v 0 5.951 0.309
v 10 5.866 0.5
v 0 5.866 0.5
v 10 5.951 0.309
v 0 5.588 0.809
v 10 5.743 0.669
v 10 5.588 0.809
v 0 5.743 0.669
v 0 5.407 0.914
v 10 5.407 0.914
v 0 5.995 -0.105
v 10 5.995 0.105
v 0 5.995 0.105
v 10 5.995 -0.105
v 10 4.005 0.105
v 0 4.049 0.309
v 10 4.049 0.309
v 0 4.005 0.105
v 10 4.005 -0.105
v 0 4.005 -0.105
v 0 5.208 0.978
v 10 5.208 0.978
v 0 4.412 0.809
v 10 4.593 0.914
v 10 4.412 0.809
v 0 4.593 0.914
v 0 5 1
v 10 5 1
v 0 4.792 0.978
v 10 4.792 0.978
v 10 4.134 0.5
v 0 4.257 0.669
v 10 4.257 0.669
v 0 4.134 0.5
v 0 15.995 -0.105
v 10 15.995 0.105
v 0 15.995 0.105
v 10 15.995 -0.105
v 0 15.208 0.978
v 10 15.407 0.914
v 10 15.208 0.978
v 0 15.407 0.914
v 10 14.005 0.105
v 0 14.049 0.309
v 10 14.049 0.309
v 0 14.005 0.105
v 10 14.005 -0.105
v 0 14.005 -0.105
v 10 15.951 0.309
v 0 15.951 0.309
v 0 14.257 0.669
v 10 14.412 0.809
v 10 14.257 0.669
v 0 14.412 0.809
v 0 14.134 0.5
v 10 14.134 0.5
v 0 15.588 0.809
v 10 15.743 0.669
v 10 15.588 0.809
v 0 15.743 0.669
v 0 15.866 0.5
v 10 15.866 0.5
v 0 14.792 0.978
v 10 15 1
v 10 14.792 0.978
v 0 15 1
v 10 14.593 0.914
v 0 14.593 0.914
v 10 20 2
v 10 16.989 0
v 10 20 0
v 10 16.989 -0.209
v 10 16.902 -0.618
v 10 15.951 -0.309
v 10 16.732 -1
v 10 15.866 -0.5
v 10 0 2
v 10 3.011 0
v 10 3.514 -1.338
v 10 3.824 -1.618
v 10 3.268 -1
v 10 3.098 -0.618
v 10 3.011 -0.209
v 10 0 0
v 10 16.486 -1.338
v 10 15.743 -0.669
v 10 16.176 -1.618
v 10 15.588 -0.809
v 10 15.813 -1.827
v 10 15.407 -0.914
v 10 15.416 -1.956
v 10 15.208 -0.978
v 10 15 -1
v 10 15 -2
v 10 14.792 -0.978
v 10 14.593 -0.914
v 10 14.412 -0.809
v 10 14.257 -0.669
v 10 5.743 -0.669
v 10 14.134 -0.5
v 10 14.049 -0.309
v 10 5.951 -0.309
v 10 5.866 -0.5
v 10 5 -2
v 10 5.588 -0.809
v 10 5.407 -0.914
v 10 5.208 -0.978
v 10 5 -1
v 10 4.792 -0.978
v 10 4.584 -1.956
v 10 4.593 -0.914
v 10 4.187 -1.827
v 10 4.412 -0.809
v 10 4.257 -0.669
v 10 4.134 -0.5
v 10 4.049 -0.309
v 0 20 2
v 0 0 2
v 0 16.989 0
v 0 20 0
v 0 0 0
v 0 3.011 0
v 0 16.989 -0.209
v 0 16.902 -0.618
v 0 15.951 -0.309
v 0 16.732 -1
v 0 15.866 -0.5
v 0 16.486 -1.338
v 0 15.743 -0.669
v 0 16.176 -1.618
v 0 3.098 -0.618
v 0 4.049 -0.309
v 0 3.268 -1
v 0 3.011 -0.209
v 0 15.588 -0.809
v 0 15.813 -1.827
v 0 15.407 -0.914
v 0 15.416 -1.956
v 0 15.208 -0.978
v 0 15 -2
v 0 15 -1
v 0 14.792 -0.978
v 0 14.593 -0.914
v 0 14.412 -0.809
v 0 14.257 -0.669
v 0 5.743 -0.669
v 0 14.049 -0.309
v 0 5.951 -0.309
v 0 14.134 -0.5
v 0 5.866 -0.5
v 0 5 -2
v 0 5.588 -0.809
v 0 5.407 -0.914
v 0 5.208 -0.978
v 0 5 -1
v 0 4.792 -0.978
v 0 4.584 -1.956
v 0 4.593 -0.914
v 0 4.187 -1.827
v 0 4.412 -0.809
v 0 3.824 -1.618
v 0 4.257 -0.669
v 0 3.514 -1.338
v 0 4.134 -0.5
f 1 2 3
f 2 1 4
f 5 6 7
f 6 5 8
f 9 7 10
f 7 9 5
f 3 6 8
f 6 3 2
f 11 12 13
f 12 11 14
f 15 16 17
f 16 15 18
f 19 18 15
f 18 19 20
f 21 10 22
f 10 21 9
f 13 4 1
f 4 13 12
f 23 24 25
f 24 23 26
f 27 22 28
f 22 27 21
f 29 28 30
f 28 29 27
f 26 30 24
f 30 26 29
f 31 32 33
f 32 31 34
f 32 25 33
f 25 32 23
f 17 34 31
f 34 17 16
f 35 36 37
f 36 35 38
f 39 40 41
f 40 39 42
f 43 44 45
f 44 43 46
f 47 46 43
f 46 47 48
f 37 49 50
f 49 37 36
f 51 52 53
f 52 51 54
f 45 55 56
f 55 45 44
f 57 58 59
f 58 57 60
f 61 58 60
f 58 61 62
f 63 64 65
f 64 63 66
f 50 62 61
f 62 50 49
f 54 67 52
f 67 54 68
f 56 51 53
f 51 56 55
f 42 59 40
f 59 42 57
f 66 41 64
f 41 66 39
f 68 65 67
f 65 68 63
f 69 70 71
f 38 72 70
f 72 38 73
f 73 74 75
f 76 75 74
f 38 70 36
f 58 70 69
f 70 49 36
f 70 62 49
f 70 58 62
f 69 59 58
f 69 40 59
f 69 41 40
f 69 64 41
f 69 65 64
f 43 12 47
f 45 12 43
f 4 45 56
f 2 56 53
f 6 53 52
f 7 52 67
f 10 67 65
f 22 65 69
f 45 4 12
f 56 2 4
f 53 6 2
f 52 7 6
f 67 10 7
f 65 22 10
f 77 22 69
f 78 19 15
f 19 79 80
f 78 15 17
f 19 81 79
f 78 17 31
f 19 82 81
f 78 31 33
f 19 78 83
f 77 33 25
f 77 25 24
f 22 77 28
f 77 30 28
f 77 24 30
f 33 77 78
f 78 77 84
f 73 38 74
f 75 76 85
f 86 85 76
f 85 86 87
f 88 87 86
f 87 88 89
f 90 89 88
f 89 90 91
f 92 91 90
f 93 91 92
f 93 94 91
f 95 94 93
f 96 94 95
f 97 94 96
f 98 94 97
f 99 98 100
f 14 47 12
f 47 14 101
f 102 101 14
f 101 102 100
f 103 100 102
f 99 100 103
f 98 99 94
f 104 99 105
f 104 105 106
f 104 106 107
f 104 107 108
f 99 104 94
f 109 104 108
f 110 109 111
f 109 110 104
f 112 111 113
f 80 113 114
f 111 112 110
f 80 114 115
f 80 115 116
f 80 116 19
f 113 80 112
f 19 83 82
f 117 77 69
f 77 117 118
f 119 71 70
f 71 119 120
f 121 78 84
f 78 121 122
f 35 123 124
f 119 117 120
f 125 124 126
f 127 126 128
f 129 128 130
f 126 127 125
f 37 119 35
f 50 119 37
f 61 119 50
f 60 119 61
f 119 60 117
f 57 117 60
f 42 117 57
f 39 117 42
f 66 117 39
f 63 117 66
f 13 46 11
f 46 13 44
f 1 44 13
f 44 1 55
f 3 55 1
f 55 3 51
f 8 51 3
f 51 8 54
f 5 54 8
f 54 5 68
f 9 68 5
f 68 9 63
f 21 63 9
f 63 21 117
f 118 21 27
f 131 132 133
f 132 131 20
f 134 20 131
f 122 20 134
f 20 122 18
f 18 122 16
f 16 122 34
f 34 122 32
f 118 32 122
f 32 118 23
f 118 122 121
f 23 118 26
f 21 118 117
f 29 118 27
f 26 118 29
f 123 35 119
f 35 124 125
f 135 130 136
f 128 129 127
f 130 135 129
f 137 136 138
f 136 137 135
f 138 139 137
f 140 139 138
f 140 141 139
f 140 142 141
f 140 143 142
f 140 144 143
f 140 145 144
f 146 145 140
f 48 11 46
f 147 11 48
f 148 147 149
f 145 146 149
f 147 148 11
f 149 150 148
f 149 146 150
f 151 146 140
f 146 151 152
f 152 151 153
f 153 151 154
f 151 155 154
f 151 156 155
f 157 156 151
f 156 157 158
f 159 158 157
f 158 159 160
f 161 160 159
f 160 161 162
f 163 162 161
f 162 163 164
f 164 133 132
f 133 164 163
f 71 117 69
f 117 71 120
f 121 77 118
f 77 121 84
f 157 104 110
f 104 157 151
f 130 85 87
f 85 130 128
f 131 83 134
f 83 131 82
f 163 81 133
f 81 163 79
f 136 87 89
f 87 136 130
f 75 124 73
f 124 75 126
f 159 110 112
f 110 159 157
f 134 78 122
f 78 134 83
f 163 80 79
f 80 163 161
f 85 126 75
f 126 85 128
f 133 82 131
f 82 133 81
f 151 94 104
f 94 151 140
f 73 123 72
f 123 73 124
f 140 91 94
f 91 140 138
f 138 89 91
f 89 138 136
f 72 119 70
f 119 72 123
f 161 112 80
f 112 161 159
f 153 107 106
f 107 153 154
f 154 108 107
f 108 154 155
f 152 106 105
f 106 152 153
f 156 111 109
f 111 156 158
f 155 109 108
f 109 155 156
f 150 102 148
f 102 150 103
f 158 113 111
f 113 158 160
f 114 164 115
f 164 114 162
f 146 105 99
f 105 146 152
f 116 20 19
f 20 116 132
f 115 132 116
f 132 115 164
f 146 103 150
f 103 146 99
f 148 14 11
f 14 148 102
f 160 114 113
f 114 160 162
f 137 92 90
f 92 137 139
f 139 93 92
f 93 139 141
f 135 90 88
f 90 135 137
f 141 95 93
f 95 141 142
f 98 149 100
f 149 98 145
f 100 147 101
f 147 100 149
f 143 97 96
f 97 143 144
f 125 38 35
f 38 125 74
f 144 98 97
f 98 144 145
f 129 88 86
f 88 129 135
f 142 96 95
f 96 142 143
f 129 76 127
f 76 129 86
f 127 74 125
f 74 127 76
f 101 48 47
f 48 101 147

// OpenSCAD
$fn=30;
difference(){
cube([10,20,2]);
translate([0,5,0])rotate([0,90,0])
{
translate([0,0,-1])cylinder(d=2,h=12);
translate([0,10,-1])cylinder(d=2,h=12);
}
}
translate([0,5,0])rotate([0,90,0])
difference(){
hull(){
cylinder(d=4,h=10);
translate([0,10,0])cylinder(d=4,h=10);
}
translate([0,0,-1])cylinder(d=2,h=12);
translate([0,10,-1])cylinder(d=2,h=12);
}
